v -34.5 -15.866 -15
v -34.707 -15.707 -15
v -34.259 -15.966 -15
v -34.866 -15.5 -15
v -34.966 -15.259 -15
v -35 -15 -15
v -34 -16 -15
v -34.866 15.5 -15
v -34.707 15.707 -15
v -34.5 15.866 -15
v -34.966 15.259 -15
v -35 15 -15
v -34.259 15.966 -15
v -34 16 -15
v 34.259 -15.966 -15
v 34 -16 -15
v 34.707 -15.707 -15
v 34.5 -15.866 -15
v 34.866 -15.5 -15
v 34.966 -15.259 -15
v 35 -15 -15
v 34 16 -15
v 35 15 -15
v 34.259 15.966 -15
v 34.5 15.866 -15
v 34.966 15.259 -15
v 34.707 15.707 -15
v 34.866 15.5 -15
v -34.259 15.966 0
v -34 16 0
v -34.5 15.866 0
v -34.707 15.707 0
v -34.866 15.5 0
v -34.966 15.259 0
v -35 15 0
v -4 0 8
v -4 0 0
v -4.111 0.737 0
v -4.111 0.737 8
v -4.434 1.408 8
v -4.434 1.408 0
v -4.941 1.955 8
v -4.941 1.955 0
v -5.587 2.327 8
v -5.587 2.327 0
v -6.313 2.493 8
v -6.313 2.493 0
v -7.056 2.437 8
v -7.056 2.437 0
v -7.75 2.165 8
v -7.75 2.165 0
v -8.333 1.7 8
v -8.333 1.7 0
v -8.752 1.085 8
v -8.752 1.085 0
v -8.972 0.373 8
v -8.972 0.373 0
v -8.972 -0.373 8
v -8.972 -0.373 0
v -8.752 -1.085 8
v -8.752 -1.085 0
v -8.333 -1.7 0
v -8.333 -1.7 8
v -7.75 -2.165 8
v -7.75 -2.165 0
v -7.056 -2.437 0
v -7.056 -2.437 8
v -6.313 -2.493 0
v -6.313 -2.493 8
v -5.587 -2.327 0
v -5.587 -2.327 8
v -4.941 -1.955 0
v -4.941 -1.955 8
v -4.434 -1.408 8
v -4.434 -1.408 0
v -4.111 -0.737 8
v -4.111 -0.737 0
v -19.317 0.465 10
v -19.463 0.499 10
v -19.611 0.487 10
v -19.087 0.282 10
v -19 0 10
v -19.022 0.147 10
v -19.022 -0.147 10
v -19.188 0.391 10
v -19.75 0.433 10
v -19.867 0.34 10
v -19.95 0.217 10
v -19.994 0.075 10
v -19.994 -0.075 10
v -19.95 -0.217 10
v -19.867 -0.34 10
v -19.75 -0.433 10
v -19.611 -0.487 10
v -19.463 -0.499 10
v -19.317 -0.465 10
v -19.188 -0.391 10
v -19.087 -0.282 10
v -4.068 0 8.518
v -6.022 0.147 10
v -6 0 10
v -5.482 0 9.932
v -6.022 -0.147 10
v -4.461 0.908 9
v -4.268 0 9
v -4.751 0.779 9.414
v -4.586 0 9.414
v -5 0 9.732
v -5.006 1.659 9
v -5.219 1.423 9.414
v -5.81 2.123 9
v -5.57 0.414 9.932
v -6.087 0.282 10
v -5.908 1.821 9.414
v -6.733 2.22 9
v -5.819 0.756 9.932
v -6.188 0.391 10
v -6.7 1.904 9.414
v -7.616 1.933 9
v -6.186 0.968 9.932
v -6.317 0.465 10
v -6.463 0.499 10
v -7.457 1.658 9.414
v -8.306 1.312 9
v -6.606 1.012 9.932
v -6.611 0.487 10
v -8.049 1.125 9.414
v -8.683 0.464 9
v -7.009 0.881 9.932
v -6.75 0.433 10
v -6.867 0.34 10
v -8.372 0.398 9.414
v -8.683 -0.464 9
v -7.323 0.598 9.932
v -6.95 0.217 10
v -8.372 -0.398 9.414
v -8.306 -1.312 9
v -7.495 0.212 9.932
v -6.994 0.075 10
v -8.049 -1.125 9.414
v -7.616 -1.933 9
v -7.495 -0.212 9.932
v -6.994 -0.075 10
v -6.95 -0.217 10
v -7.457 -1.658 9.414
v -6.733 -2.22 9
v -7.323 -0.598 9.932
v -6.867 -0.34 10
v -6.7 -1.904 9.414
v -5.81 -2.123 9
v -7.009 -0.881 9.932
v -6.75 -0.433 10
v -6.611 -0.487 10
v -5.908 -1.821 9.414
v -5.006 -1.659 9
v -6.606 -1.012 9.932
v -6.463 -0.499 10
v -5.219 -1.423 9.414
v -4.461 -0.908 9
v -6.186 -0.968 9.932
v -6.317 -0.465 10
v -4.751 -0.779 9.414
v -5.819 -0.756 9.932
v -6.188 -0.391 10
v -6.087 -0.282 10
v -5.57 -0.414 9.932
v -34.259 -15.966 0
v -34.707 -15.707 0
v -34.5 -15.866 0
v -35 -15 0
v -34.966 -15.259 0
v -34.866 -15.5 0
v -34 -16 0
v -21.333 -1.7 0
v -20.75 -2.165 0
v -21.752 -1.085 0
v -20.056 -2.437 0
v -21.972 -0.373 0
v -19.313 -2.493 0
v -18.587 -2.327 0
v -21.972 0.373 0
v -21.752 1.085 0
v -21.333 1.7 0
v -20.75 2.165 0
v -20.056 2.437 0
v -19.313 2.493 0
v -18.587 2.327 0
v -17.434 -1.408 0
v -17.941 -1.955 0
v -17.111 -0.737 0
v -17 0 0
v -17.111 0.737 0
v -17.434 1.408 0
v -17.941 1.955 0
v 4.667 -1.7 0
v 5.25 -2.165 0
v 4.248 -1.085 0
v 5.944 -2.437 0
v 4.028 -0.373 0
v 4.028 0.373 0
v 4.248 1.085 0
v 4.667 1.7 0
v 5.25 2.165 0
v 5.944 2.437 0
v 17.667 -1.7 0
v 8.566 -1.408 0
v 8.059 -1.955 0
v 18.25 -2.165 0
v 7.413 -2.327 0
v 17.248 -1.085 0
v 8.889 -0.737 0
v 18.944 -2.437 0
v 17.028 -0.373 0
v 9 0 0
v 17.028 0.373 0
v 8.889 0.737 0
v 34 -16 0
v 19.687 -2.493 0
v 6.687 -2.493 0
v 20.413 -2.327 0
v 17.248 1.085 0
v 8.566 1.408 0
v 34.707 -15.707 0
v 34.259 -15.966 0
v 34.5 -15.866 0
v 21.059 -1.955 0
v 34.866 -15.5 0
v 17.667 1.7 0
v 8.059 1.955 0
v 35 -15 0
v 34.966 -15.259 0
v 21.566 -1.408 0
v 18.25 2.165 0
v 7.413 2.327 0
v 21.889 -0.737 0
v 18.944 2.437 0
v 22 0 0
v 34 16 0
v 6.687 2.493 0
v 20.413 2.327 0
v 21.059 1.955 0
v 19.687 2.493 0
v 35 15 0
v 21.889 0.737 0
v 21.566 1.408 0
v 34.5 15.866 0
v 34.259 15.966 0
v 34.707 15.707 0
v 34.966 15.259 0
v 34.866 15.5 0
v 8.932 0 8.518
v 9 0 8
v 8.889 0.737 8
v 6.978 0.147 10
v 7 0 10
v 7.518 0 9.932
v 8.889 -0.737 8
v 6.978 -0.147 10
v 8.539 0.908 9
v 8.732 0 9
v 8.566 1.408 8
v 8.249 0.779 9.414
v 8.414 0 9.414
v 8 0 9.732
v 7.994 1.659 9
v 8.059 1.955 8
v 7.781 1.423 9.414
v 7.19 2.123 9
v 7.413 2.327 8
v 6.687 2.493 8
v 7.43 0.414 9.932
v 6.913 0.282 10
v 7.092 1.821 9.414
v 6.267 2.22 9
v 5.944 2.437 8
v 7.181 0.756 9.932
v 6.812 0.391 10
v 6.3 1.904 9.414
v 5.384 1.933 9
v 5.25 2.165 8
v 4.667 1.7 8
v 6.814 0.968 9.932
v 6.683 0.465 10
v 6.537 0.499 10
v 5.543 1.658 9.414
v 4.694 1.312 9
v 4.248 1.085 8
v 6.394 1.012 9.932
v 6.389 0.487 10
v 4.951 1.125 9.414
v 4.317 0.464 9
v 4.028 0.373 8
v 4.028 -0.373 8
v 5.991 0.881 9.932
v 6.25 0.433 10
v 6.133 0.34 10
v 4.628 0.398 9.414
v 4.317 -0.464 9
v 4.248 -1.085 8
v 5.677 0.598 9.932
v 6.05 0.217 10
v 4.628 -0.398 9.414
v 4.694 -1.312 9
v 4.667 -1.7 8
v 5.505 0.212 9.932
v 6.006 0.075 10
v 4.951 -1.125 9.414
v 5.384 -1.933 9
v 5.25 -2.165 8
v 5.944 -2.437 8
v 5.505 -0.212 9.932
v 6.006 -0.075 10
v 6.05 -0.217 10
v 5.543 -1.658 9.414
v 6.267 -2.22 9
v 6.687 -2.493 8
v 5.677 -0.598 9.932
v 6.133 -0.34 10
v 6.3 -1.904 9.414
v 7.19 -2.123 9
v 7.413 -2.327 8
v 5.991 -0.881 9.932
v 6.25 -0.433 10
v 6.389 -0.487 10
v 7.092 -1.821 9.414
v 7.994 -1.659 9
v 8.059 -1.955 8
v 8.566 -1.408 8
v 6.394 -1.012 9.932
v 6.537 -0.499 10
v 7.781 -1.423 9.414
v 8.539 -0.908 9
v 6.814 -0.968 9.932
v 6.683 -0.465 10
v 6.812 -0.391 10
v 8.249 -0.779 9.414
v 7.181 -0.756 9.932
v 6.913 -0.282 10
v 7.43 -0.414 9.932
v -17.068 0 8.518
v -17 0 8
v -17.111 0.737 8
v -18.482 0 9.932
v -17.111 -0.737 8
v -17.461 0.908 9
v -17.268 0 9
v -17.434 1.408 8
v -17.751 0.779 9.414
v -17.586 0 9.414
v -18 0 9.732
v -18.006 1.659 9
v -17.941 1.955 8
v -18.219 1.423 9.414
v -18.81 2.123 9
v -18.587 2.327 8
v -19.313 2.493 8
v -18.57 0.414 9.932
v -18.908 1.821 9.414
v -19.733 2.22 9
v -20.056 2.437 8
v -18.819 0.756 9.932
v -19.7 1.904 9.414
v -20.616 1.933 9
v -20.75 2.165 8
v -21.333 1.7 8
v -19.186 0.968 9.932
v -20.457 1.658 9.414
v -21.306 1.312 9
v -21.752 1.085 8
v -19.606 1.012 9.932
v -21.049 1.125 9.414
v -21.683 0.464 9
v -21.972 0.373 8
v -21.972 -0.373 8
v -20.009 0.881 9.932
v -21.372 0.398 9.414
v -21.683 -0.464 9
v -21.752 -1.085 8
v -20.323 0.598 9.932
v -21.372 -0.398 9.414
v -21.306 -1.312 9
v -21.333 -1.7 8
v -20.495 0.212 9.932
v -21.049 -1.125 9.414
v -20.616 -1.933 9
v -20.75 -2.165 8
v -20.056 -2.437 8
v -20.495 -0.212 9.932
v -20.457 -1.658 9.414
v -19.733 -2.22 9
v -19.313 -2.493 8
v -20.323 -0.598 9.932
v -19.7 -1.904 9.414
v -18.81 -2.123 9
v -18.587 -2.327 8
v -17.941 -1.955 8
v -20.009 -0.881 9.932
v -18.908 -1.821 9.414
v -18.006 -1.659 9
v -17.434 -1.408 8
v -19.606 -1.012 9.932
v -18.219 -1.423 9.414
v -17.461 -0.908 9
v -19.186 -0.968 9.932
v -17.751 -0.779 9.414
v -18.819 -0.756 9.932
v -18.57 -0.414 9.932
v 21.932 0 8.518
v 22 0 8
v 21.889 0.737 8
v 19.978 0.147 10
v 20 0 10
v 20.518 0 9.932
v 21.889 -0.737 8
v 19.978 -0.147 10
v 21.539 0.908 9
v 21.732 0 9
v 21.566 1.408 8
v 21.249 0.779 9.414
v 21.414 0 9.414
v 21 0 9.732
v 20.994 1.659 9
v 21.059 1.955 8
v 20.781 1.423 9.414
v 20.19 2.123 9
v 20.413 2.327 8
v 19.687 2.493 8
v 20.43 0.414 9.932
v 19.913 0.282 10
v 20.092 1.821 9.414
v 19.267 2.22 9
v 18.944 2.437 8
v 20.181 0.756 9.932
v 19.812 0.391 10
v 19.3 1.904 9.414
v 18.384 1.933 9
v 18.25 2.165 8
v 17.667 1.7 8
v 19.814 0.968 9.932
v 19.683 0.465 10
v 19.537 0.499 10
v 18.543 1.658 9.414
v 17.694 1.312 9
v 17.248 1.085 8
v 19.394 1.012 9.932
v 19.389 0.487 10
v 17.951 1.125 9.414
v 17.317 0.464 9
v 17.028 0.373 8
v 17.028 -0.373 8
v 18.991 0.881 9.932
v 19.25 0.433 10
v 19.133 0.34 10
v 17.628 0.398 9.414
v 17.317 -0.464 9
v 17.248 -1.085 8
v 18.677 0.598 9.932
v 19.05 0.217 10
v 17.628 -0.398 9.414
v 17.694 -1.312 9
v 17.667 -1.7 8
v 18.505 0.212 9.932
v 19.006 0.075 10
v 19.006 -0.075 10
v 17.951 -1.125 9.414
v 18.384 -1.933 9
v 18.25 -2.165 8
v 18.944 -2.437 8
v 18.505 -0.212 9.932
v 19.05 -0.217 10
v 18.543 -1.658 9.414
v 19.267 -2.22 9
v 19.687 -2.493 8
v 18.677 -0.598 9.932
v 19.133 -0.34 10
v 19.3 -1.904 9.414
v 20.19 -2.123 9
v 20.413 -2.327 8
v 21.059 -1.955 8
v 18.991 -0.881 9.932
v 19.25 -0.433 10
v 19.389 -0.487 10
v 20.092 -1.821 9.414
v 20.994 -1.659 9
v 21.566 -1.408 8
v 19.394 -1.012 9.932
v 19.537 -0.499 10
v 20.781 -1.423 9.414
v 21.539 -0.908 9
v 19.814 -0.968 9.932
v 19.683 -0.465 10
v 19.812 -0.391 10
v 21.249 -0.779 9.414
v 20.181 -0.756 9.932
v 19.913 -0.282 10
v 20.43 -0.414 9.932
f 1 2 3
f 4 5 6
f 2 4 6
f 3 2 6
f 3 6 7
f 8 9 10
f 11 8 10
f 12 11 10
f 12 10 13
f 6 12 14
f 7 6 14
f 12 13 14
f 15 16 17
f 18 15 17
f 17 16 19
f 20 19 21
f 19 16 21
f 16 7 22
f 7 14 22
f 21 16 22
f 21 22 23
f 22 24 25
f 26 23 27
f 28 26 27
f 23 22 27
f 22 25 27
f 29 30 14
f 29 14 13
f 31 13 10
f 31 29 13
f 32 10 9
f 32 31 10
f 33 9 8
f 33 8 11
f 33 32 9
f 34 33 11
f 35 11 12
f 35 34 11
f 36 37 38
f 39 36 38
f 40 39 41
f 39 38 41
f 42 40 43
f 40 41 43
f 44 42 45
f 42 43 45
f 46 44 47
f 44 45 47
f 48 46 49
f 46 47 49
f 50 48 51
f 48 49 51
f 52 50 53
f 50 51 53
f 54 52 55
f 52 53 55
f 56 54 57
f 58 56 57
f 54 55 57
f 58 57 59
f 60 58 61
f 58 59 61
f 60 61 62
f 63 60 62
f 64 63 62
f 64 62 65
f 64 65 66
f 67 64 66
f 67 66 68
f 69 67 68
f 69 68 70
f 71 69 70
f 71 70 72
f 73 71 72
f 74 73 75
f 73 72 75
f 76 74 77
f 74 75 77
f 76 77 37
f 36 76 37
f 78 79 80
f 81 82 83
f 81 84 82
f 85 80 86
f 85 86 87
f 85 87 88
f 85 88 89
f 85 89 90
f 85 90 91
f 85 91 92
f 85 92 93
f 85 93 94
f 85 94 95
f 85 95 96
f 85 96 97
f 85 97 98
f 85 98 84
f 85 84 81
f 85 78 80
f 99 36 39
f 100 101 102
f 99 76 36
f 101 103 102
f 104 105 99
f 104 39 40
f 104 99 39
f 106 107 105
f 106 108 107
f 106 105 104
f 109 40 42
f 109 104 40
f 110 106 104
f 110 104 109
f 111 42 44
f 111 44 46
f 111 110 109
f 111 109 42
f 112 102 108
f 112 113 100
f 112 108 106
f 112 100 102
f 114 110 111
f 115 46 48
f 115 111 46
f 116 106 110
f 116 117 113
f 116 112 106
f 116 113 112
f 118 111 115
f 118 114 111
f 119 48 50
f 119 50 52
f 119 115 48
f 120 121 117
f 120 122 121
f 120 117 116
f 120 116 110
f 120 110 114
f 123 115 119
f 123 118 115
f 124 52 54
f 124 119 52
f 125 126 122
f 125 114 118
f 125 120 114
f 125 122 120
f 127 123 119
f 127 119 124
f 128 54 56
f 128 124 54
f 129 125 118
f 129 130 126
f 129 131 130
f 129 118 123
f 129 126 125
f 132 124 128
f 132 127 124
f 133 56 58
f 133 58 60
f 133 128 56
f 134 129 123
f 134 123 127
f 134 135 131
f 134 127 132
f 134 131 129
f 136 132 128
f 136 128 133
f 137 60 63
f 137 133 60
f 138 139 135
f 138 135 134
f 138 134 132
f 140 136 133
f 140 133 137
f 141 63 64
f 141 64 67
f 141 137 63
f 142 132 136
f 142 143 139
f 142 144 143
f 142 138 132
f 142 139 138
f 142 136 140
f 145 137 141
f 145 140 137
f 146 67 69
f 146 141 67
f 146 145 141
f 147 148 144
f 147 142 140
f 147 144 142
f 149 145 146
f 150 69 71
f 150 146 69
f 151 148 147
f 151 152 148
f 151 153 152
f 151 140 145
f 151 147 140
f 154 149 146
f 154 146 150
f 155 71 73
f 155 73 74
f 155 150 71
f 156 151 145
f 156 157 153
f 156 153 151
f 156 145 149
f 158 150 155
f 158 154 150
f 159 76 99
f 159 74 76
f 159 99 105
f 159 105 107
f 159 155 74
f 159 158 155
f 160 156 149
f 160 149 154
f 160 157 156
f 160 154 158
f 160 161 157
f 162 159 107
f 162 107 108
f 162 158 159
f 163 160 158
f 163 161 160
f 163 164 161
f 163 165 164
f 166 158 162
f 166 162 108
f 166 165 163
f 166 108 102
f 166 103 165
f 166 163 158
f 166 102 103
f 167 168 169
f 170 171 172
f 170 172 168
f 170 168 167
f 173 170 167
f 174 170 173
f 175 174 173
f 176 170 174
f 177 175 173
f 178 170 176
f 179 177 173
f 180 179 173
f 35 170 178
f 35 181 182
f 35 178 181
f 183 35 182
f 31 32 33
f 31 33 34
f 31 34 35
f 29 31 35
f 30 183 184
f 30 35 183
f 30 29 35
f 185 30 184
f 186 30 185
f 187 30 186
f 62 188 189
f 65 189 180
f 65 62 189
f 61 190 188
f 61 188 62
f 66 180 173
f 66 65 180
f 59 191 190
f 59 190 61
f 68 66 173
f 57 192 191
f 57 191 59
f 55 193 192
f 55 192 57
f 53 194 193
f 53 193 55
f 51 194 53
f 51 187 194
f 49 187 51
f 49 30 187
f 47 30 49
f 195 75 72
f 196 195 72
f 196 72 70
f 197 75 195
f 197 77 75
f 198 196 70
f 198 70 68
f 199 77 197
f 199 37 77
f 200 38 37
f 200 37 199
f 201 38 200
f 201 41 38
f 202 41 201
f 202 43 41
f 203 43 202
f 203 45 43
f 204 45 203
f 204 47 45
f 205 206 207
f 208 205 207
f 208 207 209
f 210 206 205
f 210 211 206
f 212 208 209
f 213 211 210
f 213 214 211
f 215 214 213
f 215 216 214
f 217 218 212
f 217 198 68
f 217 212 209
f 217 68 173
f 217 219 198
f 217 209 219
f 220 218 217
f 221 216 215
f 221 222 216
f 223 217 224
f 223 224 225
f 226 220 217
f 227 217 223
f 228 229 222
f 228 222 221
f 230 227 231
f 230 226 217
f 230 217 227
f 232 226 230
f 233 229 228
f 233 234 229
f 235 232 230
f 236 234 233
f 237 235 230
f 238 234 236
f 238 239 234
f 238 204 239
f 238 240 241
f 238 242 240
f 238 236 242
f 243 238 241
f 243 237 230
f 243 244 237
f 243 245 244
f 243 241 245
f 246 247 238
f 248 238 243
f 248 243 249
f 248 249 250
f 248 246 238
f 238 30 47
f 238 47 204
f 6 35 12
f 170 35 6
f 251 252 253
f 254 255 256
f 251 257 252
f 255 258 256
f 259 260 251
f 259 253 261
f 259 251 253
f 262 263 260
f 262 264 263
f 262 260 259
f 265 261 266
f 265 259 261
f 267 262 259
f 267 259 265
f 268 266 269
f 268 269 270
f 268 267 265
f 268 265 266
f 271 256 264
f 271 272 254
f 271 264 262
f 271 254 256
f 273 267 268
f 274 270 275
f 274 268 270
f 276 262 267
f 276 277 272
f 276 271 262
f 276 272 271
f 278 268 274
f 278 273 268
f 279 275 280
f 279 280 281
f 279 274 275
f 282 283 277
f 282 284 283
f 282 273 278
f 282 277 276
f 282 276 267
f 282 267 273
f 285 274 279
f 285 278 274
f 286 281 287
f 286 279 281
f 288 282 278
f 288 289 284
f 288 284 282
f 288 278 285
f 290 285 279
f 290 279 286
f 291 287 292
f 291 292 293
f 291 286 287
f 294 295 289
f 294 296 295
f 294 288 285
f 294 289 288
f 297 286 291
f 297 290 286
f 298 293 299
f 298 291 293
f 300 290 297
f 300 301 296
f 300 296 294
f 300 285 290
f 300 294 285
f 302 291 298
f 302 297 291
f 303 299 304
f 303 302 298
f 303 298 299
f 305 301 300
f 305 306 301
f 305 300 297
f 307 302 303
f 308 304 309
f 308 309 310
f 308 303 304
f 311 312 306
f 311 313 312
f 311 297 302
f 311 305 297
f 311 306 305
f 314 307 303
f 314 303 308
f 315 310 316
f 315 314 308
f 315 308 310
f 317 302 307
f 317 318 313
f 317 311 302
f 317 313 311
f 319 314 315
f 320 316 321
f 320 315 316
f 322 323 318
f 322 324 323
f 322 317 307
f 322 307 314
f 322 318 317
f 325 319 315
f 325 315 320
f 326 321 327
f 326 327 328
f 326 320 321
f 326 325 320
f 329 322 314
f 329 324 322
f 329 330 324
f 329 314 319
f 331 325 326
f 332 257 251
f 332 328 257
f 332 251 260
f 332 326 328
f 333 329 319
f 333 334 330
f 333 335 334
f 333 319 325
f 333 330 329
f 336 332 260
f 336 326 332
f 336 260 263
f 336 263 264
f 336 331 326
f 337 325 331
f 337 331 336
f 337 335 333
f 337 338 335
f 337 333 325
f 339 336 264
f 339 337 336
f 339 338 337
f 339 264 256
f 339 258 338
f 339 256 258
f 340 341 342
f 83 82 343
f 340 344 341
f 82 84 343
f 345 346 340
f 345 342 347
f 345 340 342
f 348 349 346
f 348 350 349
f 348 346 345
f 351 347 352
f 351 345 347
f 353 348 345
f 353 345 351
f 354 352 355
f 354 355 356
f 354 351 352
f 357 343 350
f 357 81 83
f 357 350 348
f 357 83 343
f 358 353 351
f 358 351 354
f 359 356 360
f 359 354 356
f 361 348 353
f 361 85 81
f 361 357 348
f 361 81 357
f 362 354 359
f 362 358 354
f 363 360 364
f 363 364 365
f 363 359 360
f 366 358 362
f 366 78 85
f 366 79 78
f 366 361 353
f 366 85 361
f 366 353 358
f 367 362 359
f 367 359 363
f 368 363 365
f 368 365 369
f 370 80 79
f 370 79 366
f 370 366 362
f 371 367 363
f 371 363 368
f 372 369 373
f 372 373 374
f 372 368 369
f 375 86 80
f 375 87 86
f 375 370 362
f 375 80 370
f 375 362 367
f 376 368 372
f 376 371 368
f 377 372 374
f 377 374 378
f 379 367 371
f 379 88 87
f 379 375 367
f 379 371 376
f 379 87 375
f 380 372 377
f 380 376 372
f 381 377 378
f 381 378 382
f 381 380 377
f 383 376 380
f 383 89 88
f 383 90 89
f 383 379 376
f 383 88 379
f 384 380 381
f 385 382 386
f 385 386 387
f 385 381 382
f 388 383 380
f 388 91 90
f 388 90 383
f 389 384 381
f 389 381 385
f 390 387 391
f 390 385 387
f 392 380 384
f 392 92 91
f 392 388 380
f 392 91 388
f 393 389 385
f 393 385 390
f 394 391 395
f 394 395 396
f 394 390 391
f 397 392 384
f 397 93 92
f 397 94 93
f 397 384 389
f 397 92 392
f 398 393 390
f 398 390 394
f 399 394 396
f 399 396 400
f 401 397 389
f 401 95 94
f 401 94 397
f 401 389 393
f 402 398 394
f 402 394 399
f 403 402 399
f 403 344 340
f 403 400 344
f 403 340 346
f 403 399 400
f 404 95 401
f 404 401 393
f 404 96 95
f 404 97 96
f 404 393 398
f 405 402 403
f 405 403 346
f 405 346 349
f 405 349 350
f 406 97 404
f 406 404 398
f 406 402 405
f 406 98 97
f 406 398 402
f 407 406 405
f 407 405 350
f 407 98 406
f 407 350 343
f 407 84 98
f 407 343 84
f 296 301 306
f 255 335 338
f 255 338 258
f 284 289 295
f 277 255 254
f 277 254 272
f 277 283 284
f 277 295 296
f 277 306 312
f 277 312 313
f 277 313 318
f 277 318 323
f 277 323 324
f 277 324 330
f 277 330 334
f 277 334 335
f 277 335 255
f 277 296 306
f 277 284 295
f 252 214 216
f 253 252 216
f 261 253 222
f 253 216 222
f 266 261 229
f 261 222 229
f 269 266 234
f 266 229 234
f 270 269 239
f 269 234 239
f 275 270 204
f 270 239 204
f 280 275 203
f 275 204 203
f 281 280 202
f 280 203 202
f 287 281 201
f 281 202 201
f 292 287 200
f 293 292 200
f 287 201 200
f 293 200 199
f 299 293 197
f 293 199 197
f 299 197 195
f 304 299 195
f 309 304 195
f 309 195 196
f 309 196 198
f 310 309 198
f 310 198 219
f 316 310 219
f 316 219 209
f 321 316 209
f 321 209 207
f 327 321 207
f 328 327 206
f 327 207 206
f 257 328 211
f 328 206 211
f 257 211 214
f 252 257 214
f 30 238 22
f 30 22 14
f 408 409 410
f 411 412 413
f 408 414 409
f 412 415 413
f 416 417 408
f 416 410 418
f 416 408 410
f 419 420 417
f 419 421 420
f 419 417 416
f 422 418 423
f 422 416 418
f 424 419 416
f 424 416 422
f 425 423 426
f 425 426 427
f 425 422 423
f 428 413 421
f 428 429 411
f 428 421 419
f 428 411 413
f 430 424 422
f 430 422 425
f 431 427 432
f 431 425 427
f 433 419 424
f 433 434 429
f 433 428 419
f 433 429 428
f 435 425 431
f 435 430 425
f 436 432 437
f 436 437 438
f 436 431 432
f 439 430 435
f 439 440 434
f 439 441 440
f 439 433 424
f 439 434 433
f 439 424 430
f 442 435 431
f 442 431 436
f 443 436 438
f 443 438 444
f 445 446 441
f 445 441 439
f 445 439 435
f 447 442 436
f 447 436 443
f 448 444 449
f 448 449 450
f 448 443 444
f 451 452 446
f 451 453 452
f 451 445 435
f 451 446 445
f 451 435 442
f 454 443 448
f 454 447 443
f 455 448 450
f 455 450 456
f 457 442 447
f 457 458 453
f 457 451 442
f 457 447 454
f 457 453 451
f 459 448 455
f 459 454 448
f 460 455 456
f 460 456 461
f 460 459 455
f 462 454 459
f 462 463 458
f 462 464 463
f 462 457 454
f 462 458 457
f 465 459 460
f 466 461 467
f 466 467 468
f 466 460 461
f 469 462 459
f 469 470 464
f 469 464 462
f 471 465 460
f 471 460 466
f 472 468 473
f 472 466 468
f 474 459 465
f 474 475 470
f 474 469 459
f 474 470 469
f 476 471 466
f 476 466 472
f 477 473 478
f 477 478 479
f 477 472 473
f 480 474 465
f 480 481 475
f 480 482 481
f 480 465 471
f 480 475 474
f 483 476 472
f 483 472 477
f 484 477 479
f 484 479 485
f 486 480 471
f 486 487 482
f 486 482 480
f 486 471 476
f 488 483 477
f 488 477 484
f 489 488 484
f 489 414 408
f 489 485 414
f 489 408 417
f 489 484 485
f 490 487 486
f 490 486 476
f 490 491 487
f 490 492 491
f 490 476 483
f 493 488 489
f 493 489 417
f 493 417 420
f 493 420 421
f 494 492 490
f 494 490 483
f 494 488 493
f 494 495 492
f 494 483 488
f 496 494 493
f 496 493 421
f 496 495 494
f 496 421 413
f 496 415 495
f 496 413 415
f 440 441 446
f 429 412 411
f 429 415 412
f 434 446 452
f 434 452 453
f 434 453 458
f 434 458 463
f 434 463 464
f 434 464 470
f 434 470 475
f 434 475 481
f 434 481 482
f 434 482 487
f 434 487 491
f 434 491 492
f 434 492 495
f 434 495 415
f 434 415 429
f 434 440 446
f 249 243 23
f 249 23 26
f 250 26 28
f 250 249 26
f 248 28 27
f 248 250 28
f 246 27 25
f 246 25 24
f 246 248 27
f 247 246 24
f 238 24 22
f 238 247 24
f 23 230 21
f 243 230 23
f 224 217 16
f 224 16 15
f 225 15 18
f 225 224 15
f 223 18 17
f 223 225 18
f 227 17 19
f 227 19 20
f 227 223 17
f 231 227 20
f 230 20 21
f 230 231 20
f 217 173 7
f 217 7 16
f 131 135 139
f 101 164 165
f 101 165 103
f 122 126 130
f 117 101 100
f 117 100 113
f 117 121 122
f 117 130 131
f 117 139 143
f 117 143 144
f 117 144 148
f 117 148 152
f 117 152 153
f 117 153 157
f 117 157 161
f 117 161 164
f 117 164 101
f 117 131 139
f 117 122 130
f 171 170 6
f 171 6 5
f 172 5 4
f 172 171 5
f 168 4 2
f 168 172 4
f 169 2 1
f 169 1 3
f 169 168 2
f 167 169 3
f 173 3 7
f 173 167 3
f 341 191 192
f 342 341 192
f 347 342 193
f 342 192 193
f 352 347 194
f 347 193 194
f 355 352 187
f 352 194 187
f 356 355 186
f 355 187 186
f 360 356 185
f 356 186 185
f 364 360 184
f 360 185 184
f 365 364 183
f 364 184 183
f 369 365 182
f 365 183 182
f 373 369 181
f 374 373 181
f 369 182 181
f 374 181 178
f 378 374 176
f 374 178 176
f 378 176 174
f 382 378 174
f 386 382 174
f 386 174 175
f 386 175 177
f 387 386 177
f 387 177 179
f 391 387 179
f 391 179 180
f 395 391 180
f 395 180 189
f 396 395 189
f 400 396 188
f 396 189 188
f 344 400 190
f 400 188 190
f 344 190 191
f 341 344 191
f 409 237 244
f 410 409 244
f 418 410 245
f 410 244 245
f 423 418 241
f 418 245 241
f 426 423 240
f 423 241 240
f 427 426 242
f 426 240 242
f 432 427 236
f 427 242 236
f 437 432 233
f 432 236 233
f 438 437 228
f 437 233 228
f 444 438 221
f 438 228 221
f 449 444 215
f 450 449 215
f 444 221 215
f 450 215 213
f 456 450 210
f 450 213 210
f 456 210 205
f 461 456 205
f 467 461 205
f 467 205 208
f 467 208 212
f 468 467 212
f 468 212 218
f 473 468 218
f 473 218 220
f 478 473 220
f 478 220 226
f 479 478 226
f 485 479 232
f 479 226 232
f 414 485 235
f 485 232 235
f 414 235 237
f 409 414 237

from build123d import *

# Parameters (mm, degrees)
F1_DEPTH = 15
F2_R     = 2.5
F3_DEPTH = 10
F4_R     = 2


with BuildPart() as f1:
    # F0 (on Top) → F1 (new body)
    with BuildSketch(Plane.XY):
        with BuildLine():
            Line((34, 16), (-34, 16))
            ThreePointArc((-34, 16), (-34.707107, 15.707107), (-35, 15))
            Line((-35, 15), (-35, -15))
            ThreePointArc((-35, -15), (-34.707107, -15.707107), (-34, -16))
            Line((-34, -16), (34, -16))
            ThreePointArc((34, -16), (34.707107, -15.707107), (35, -15))
            Line((35, -15), (35, 15))
            ThreePointArc((35, 15), (34.707107, 15.707107), (34, 16))
        make_face()
    extrude(amount=-F1_DEPTH)

    # F2 (on face) → F3 (join)
    with BuildSketch(Plane.XY):
        with Locations((-19.5, 0)):
            Circle(F2_R)
        with Locations((-6.5, 0)):
            Circle(F2_R)
        with Locations((6.5, 0)):
            Circle(F2_R)
        with Locations((19.5, 0)):
            Circle(F2_R)
    extrude(amount=F3_DEPTH)

    # F4
    f4_edges = [f1.edges().sort_by_distance(p)[0] for p in [
        (17, 0, 10),
        (4, 0, 10),
        (-9, 0, 10),
        (-22, 0, 10),
    ]]
    fillet(f4_edges, radius=F4_R)


solid = f1.part
